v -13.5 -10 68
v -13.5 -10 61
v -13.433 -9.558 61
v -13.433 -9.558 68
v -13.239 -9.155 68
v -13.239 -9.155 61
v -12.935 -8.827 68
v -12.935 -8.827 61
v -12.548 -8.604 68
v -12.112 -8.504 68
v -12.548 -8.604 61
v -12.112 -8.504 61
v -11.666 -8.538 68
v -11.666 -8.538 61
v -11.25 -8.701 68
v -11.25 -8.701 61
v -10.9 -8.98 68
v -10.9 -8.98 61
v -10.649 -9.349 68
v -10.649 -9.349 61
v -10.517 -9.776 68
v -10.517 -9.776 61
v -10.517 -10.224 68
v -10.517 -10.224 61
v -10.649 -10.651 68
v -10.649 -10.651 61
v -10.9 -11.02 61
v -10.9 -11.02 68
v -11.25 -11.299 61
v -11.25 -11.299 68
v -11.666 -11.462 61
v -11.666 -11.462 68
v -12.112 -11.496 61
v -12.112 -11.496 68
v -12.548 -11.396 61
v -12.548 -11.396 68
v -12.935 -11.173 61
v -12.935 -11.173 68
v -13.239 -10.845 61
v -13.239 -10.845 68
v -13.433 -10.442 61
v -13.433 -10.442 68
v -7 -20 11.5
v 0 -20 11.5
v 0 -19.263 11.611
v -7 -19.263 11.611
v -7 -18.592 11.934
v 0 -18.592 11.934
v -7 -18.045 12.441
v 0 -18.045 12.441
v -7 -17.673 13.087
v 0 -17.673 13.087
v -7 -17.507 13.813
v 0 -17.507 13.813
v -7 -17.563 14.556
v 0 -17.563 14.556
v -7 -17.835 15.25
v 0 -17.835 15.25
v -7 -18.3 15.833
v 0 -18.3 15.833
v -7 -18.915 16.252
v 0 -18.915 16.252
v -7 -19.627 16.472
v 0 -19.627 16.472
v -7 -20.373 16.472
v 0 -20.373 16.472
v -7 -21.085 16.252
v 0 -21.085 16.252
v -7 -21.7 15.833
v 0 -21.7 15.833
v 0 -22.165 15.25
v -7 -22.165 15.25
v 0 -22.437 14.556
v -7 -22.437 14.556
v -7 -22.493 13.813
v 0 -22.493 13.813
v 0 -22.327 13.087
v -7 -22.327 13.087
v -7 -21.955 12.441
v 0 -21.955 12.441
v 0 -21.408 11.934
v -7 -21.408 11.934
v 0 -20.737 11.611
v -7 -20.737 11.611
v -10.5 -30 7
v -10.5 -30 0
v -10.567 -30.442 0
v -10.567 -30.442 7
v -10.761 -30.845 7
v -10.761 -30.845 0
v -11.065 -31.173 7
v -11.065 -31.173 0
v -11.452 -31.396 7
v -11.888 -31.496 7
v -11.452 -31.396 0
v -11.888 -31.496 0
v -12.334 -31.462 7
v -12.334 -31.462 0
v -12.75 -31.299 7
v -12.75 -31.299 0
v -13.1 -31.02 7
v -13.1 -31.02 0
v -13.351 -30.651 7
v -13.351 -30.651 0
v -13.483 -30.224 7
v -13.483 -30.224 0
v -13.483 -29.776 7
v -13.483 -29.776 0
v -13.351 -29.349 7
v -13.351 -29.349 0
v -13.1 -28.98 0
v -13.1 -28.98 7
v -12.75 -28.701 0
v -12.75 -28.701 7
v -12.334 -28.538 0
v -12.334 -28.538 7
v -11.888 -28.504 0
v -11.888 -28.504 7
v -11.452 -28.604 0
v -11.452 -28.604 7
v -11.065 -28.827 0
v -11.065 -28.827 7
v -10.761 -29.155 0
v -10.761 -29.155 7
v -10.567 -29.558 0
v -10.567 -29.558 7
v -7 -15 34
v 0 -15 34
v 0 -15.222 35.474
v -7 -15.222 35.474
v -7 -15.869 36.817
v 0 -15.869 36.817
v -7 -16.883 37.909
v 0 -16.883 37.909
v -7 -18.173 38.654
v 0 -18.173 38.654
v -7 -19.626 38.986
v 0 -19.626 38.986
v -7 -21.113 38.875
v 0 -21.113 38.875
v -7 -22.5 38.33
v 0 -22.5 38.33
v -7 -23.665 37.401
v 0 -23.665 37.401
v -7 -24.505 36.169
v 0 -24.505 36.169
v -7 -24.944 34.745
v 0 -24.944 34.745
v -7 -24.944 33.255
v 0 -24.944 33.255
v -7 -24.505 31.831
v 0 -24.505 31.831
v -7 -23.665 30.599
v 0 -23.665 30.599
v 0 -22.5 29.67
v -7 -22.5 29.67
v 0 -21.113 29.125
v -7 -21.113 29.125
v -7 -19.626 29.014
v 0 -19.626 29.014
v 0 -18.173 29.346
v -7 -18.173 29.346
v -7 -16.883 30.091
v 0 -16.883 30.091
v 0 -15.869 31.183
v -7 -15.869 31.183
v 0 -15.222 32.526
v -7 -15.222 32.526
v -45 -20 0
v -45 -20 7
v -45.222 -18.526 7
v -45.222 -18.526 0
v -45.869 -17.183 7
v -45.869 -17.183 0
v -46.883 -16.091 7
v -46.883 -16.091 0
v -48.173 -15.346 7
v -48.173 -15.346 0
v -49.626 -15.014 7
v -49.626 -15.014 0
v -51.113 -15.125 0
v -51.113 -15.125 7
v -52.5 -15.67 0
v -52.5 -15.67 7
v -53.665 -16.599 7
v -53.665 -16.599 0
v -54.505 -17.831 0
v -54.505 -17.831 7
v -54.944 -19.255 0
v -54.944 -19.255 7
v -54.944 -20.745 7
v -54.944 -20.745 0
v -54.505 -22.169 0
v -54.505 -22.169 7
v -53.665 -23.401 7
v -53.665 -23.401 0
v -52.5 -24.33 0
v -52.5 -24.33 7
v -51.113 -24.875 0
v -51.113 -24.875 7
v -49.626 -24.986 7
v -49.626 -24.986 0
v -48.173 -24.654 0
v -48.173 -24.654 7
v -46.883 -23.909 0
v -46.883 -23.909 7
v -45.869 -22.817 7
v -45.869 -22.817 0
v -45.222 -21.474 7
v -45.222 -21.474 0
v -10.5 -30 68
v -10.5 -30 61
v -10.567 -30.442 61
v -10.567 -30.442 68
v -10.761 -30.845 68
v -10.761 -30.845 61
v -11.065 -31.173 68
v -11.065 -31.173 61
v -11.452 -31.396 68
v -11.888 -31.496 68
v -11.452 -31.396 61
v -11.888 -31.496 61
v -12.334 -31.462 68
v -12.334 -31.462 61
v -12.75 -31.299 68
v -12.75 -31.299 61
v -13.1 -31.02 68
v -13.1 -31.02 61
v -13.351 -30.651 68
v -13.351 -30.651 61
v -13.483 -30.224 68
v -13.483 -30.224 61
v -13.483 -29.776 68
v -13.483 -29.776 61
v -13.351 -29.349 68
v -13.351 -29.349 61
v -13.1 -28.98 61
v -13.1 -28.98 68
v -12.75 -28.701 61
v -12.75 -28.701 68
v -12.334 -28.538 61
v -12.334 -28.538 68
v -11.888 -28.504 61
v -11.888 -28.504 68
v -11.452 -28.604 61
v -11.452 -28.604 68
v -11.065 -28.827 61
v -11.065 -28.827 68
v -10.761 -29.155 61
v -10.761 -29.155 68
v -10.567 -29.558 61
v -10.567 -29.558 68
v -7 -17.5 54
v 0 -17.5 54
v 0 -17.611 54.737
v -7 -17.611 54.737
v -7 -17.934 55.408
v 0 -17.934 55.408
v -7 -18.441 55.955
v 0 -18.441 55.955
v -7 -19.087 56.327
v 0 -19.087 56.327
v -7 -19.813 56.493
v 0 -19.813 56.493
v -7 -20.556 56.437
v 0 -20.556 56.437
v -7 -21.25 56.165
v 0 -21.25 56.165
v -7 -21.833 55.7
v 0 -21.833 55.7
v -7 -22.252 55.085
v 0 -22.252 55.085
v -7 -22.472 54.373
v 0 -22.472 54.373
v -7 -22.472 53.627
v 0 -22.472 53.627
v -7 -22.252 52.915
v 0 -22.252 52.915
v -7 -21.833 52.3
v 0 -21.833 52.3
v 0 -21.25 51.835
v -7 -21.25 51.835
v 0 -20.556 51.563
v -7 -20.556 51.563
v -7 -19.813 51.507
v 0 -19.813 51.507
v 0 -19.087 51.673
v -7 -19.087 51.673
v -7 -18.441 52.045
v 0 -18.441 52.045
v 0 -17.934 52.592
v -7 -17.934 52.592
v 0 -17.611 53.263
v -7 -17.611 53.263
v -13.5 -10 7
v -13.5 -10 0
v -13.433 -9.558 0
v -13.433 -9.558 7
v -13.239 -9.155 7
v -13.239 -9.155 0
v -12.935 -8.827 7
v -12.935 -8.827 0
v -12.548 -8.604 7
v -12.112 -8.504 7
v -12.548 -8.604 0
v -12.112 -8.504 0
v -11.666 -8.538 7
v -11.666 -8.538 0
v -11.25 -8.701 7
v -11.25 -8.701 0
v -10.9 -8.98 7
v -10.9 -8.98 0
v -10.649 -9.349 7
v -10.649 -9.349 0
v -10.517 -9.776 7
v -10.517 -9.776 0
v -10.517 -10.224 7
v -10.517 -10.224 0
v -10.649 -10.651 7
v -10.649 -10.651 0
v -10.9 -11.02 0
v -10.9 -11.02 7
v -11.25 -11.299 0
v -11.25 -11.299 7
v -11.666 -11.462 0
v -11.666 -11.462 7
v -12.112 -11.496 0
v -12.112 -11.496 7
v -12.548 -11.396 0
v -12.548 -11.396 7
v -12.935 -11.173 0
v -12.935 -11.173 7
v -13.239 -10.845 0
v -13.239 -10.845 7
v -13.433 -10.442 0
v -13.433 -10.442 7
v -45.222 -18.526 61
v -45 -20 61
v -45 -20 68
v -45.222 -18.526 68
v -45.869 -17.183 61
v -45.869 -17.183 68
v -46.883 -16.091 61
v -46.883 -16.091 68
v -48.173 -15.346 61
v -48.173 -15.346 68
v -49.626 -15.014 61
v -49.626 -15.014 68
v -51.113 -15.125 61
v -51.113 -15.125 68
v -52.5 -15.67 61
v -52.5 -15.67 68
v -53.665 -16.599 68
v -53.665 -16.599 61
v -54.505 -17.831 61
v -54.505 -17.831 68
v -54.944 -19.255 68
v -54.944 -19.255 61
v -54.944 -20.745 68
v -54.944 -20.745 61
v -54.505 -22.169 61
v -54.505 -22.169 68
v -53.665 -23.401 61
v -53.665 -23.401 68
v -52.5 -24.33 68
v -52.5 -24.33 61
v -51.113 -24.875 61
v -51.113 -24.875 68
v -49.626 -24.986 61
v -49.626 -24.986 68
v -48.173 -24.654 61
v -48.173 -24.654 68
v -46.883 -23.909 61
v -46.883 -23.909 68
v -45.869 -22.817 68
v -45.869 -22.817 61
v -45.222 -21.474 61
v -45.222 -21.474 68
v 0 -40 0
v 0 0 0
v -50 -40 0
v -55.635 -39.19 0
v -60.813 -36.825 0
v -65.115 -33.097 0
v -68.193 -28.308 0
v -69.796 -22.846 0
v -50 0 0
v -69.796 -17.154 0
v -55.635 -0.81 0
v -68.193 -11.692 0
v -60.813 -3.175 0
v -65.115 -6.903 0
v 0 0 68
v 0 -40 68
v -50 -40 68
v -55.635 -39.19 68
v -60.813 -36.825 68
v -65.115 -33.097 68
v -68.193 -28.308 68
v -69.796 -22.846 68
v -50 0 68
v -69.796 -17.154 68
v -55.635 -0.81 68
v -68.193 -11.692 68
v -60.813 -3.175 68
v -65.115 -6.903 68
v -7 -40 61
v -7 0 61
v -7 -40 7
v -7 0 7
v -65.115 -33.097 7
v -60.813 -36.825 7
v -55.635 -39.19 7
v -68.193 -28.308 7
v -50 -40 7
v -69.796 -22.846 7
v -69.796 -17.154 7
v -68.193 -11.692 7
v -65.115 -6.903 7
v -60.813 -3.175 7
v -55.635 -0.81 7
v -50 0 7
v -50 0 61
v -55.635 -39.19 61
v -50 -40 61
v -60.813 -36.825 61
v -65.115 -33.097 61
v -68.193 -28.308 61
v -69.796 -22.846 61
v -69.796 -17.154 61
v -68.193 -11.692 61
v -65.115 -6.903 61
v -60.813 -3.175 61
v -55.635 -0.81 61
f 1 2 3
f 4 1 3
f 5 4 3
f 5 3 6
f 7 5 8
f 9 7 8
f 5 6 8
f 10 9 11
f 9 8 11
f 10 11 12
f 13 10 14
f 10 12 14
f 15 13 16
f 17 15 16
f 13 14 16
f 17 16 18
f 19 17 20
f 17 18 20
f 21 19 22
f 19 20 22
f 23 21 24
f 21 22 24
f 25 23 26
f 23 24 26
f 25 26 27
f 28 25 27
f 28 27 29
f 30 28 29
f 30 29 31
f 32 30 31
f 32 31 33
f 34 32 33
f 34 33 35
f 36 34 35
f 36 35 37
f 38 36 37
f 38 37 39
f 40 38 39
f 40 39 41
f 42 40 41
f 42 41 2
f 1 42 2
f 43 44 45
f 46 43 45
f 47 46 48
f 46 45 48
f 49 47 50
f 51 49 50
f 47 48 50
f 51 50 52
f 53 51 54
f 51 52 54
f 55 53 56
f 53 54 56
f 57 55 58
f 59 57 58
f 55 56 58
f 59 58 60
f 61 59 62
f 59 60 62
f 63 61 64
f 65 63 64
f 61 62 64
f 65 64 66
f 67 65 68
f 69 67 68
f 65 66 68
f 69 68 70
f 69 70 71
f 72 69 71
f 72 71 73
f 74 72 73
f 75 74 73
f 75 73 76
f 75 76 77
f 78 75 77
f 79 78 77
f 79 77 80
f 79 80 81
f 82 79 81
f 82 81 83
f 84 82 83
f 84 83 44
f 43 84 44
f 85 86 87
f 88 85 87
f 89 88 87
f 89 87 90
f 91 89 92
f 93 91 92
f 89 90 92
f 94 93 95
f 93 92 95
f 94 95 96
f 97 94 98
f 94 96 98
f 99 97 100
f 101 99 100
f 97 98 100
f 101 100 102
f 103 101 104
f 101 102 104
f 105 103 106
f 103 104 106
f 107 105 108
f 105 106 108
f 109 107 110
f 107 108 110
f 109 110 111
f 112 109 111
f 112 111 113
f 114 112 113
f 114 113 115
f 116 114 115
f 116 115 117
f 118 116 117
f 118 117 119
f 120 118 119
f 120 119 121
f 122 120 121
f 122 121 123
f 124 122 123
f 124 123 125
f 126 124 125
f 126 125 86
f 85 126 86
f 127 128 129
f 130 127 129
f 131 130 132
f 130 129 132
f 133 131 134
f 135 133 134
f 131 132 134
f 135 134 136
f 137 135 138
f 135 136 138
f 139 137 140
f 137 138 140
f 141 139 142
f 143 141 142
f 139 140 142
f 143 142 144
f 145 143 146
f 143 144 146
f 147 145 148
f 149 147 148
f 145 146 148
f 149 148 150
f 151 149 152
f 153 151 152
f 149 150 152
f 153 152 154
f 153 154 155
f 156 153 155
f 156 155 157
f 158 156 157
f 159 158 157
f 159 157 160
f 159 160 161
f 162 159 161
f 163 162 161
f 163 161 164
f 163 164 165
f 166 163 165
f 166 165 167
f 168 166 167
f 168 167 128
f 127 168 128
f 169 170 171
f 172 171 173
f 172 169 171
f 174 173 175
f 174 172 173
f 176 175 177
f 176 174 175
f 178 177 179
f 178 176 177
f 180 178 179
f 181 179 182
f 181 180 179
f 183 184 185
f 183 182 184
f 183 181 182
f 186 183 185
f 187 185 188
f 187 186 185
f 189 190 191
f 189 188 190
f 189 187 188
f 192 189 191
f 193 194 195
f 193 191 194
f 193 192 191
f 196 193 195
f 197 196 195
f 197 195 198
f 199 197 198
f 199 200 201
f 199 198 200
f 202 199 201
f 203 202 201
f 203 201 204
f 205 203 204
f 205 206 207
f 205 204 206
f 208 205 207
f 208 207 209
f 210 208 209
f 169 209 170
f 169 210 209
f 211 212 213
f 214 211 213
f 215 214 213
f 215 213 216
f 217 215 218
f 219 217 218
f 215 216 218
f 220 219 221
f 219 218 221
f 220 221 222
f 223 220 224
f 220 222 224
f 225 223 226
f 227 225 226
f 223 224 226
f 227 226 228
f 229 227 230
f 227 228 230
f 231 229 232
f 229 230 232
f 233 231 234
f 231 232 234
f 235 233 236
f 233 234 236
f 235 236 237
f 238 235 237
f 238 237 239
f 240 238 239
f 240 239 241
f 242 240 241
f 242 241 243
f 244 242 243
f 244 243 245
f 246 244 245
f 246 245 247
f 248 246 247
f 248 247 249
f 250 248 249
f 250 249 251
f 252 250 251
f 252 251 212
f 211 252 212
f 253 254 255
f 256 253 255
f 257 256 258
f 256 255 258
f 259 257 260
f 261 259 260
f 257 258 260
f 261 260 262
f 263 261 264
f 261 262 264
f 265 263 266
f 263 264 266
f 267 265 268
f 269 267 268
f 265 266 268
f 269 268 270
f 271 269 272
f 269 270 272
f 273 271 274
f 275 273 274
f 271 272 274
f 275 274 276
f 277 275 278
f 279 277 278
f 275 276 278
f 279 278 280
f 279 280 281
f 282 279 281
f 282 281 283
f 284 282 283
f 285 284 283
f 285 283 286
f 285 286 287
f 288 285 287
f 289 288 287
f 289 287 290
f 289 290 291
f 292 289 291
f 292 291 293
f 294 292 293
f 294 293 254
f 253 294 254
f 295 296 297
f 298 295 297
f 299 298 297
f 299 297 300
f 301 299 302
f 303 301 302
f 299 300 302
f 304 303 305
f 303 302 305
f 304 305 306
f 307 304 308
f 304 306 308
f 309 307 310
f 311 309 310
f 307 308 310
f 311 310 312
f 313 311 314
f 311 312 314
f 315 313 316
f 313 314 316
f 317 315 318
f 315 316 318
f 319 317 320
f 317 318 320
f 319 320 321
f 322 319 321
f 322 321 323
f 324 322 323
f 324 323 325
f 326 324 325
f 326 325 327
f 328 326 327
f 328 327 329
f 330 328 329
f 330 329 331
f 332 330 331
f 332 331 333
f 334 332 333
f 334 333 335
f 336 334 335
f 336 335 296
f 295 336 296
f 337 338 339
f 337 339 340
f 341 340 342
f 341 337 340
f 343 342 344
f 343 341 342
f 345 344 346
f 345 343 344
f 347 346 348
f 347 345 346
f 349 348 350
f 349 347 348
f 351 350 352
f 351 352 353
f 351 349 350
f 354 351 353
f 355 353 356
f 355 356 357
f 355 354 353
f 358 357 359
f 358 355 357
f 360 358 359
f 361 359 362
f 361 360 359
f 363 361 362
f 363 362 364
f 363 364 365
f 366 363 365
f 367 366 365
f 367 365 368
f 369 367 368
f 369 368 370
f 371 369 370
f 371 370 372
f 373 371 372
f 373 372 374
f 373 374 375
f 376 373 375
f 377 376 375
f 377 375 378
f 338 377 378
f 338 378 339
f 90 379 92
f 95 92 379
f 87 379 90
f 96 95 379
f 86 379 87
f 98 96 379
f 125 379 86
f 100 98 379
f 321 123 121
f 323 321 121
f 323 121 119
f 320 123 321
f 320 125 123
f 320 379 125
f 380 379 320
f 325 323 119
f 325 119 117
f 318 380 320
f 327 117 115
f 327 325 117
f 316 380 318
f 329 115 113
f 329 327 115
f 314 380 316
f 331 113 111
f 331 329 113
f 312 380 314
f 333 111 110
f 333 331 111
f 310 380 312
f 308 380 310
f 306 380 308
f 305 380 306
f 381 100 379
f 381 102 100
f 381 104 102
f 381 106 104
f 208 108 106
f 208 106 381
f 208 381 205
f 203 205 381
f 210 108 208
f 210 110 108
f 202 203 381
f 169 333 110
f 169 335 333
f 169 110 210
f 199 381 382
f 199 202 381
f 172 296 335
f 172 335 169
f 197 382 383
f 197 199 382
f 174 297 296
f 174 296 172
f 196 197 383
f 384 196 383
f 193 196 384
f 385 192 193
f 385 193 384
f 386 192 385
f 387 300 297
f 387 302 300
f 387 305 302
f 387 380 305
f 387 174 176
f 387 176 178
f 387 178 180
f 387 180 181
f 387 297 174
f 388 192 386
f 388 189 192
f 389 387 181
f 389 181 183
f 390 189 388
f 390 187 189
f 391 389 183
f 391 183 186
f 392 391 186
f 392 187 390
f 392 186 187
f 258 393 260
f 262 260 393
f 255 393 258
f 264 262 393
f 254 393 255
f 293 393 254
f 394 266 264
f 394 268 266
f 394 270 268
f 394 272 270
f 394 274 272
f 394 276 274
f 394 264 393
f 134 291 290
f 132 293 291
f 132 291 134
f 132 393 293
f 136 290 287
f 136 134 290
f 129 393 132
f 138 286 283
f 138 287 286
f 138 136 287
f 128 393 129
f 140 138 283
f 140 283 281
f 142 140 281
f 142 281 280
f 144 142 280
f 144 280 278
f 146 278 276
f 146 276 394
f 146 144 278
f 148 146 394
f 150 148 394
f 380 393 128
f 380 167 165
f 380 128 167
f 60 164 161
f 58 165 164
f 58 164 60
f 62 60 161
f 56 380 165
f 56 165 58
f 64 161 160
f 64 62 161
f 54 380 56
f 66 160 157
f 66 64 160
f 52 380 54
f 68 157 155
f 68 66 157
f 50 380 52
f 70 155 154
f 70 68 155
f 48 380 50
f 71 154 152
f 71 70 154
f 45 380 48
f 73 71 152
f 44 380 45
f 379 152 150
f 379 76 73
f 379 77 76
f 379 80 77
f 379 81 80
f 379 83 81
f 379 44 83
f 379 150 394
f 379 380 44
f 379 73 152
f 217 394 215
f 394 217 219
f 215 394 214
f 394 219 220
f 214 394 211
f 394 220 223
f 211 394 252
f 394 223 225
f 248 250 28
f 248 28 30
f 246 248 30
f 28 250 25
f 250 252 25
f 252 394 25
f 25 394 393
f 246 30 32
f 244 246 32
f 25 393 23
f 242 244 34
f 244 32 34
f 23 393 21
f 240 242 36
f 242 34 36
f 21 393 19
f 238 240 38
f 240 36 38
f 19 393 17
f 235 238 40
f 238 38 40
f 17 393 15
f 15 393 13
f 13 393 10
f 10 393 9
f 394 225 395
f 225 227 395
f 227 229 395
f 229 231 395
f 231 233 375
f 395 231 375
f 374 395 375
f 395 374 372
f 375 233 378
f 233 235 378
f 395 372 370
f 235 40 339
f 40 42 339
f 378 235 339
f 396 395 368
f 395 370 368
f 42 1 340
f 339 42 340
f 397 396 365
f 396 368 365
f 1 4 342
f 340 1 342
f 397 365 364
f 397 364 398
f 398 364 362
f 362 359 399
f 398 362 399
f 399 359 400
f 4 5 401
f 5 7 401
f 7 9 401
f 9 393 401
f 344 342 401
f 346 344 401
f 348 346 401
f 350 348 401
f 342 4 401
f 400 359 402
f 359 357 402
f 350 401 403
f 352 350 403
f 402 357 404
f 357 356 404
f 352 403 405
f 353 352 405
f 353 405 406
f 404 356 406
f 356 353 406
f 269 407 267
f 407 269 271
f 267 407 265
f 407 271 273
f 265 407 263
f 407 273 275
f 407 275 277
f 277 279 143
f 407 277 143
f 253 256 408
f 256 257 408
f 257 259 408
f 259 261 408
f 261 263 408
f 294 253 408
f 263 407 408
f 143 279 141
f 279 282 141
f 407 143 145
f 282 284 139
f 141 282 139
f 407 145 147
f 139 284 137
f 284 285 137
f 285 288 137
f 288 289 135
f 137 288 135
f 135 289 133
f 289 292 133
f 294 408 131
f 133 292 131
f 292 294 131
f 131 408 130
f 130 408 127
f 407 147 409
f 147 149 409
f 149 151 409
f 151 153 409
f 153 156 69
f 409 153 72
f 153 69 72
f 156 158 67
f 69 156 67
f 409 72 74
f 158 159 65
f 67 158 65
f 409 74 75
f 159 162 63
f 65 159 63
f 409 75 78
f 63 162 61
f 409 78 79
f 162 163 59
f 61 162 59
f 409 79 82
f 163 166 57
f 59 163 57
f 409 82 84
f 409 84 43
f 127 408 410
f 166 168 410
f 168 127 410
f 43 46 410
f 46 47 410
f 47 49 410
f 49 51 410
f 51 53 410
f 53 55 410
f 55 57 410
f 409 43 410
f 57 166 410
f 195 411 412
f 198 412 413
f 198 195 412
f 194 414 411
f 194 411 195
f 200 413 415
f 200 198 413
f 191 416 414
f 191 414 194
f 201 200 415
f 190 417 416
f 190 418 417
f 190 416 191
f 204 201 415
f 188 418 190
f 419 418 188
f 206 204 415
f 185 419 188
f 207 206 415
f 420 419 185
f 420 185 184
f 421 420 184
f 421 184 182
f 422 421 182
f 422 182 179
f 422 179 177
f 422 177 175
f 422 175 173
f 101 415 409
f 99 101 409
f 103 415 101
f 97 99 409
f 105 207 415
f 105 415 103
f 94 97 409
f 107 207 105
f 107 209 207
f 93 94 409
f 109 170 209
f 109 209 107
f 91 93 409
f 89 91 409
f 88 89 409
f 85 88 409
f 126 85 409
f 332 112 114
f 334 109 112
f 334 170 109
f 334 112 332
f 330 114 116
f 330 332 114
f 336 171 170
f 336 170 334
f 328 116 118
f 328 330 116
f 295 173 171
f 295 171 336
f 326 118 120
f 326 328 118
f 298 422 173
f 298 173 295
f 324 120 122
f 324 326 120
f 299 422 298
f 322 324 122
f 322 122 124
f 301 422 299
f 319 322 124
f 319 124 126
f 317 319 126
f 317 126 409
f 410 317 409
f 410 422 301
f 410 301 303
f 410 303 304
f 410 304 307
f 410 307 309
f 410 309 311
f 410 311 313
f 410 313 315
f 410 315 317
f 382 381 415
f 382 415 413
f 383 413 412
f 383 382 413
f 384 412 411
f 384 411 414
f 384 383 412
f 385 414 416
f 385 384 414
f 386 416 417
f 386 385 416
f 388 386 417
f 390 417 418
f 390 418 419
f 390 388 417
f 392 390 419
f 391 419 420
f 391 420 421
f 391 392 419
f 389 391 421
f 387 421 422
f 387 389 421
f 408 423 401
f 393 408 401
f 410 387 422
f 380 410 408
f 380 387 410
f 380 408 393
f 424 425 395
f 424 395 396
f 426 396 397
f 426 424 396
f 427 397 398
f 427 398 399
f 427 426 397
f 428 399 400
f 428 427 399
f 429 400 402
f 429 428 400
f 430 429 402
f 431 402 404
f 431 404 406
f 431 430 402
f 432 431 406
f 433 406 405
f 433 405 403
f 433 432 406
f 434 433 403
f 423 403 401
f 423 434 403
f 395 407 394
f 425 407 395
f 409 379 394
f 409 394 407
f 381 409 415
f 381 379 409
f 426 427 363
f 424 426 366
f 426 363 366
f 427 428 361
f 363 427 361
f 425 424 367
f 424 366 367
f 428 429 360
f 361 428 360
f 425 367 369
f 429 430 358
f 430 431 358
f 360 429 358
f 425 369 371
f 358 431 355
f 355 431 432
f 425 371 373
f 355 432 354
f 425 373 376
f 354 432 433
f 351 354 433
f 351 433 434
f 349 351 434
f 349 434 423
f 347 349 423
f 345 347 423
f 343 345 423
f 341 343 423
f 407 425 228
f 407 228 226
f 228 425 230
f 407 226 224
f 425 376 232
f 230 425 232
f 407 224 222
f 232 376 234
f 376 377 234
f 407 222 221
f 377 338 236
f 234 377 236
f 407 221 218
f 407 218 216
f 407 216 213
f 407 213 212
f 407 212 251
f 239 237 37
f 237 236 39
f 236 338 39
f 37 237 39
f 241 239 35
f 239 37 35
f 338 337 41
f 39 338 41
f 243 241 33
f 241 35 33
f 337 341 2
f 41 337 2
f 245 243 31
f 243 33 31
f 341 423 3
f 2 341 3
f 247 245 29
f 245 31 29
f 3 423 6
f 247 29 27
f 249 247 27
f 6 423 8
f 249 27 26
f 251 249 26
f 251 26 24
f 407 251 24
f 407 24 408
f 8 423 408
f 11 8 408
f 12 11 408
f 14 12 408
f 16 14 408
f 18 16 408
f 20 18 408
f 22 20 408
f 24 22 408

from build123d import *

# Parameters (mm, degrees)
SKETCH_1_R          = 5
EXTRUDE_1_DEPTH     = 68
SKETCH_2_W          = 68.768815545
SKETCH_2_H          = 54
CUT_EXTRUDE_1_DEPTH = 106.470374987
SKETCH_3_R          = 5
SKETCH_3_R_2        = 2.5
CUT_EXTRUDE_2_DEPTH = 106.470374987
SKETCH_4_R          = 1.5
CUT_EXTRUDE_3_DEPTH = 106.470374987


with BuildPart() as part:
    # ｽｹｯﾁ1 → ﾎﾞｽ - 押し出し1 (new body)
    with BuildSketch(Plane.XY):
        with BuildLine():
            Line((0, 0), (0, -40))
            Line((0, -40), (-50, -40))
            ThreePointArc((-50, -40), (-70, -20), (-50, 0))
            Line((-50, 0), (0, 0))
        make_face()
        with Locations((-50, -20)):
            Circle(SKETCH_1_R, mode=Mode.SUBTRACT)
    extrude(amount=EXTRUDE_1_DEPTH)

    # ｽｹｯﾁ2 → ｶｯﾄ - 押し出し1 (cut, through all)
    with BuildSketch(Plane(origin=(0, 0, 0), x_dir=(1, 0, 0), z_dir=(0, 1, 0))):
        with Locations((-41.384407773, -34)):
            Rectangle(SKETCH_2_W, SKETCH_2_H)
    extrude(amount=-CUT_EXTRUDE_1_DEPTH, mode=Mode.SUBTRACT)

    # ｽｹｯﾁ3 → ｶｯﾄ - 押し出し2 (cut, through all)
    with BuildSketch(Plane(origin=(0, 0, 0), x_dir=(0, 0, -1), z_dir=(1, 0, 0))):
        with Locations(Location((-34, -20, 0), (0, 0, 90))):
            Circle(SKETCH_3_R)
        with Locations(Location((-54, -20, 0), (0, 0, 90))):
            Circle(SKETCH_3_R_2)
        with Locations((-14, -20)):
            Circle(SKETCH_3_R_2)
    extrude(amount=-CUT_EXTRUDE_2_DEPTH, mode=Mode.SUBTRACT)

    # ｽｹｯﾁ4 → ｶｯﾄ - 押し出し3 (cut, through all)
    with BuildSketch(Plane(origin=(0, 0, 0), x_dir=(-1, 0, 0), z_dir=(0, 0, -1))):
        with Locations((12, -10)):
            Circle(SKETCH_4_R)
        with Locations(Location((12, -30, 0), (0, 0, 180))):
            Circle(SKETCH_4_R)
    extrude(amount=-CUT_EXTRUDE_3_DEPTH, mode=Mode.SUBTRACT)


solid = part.part
